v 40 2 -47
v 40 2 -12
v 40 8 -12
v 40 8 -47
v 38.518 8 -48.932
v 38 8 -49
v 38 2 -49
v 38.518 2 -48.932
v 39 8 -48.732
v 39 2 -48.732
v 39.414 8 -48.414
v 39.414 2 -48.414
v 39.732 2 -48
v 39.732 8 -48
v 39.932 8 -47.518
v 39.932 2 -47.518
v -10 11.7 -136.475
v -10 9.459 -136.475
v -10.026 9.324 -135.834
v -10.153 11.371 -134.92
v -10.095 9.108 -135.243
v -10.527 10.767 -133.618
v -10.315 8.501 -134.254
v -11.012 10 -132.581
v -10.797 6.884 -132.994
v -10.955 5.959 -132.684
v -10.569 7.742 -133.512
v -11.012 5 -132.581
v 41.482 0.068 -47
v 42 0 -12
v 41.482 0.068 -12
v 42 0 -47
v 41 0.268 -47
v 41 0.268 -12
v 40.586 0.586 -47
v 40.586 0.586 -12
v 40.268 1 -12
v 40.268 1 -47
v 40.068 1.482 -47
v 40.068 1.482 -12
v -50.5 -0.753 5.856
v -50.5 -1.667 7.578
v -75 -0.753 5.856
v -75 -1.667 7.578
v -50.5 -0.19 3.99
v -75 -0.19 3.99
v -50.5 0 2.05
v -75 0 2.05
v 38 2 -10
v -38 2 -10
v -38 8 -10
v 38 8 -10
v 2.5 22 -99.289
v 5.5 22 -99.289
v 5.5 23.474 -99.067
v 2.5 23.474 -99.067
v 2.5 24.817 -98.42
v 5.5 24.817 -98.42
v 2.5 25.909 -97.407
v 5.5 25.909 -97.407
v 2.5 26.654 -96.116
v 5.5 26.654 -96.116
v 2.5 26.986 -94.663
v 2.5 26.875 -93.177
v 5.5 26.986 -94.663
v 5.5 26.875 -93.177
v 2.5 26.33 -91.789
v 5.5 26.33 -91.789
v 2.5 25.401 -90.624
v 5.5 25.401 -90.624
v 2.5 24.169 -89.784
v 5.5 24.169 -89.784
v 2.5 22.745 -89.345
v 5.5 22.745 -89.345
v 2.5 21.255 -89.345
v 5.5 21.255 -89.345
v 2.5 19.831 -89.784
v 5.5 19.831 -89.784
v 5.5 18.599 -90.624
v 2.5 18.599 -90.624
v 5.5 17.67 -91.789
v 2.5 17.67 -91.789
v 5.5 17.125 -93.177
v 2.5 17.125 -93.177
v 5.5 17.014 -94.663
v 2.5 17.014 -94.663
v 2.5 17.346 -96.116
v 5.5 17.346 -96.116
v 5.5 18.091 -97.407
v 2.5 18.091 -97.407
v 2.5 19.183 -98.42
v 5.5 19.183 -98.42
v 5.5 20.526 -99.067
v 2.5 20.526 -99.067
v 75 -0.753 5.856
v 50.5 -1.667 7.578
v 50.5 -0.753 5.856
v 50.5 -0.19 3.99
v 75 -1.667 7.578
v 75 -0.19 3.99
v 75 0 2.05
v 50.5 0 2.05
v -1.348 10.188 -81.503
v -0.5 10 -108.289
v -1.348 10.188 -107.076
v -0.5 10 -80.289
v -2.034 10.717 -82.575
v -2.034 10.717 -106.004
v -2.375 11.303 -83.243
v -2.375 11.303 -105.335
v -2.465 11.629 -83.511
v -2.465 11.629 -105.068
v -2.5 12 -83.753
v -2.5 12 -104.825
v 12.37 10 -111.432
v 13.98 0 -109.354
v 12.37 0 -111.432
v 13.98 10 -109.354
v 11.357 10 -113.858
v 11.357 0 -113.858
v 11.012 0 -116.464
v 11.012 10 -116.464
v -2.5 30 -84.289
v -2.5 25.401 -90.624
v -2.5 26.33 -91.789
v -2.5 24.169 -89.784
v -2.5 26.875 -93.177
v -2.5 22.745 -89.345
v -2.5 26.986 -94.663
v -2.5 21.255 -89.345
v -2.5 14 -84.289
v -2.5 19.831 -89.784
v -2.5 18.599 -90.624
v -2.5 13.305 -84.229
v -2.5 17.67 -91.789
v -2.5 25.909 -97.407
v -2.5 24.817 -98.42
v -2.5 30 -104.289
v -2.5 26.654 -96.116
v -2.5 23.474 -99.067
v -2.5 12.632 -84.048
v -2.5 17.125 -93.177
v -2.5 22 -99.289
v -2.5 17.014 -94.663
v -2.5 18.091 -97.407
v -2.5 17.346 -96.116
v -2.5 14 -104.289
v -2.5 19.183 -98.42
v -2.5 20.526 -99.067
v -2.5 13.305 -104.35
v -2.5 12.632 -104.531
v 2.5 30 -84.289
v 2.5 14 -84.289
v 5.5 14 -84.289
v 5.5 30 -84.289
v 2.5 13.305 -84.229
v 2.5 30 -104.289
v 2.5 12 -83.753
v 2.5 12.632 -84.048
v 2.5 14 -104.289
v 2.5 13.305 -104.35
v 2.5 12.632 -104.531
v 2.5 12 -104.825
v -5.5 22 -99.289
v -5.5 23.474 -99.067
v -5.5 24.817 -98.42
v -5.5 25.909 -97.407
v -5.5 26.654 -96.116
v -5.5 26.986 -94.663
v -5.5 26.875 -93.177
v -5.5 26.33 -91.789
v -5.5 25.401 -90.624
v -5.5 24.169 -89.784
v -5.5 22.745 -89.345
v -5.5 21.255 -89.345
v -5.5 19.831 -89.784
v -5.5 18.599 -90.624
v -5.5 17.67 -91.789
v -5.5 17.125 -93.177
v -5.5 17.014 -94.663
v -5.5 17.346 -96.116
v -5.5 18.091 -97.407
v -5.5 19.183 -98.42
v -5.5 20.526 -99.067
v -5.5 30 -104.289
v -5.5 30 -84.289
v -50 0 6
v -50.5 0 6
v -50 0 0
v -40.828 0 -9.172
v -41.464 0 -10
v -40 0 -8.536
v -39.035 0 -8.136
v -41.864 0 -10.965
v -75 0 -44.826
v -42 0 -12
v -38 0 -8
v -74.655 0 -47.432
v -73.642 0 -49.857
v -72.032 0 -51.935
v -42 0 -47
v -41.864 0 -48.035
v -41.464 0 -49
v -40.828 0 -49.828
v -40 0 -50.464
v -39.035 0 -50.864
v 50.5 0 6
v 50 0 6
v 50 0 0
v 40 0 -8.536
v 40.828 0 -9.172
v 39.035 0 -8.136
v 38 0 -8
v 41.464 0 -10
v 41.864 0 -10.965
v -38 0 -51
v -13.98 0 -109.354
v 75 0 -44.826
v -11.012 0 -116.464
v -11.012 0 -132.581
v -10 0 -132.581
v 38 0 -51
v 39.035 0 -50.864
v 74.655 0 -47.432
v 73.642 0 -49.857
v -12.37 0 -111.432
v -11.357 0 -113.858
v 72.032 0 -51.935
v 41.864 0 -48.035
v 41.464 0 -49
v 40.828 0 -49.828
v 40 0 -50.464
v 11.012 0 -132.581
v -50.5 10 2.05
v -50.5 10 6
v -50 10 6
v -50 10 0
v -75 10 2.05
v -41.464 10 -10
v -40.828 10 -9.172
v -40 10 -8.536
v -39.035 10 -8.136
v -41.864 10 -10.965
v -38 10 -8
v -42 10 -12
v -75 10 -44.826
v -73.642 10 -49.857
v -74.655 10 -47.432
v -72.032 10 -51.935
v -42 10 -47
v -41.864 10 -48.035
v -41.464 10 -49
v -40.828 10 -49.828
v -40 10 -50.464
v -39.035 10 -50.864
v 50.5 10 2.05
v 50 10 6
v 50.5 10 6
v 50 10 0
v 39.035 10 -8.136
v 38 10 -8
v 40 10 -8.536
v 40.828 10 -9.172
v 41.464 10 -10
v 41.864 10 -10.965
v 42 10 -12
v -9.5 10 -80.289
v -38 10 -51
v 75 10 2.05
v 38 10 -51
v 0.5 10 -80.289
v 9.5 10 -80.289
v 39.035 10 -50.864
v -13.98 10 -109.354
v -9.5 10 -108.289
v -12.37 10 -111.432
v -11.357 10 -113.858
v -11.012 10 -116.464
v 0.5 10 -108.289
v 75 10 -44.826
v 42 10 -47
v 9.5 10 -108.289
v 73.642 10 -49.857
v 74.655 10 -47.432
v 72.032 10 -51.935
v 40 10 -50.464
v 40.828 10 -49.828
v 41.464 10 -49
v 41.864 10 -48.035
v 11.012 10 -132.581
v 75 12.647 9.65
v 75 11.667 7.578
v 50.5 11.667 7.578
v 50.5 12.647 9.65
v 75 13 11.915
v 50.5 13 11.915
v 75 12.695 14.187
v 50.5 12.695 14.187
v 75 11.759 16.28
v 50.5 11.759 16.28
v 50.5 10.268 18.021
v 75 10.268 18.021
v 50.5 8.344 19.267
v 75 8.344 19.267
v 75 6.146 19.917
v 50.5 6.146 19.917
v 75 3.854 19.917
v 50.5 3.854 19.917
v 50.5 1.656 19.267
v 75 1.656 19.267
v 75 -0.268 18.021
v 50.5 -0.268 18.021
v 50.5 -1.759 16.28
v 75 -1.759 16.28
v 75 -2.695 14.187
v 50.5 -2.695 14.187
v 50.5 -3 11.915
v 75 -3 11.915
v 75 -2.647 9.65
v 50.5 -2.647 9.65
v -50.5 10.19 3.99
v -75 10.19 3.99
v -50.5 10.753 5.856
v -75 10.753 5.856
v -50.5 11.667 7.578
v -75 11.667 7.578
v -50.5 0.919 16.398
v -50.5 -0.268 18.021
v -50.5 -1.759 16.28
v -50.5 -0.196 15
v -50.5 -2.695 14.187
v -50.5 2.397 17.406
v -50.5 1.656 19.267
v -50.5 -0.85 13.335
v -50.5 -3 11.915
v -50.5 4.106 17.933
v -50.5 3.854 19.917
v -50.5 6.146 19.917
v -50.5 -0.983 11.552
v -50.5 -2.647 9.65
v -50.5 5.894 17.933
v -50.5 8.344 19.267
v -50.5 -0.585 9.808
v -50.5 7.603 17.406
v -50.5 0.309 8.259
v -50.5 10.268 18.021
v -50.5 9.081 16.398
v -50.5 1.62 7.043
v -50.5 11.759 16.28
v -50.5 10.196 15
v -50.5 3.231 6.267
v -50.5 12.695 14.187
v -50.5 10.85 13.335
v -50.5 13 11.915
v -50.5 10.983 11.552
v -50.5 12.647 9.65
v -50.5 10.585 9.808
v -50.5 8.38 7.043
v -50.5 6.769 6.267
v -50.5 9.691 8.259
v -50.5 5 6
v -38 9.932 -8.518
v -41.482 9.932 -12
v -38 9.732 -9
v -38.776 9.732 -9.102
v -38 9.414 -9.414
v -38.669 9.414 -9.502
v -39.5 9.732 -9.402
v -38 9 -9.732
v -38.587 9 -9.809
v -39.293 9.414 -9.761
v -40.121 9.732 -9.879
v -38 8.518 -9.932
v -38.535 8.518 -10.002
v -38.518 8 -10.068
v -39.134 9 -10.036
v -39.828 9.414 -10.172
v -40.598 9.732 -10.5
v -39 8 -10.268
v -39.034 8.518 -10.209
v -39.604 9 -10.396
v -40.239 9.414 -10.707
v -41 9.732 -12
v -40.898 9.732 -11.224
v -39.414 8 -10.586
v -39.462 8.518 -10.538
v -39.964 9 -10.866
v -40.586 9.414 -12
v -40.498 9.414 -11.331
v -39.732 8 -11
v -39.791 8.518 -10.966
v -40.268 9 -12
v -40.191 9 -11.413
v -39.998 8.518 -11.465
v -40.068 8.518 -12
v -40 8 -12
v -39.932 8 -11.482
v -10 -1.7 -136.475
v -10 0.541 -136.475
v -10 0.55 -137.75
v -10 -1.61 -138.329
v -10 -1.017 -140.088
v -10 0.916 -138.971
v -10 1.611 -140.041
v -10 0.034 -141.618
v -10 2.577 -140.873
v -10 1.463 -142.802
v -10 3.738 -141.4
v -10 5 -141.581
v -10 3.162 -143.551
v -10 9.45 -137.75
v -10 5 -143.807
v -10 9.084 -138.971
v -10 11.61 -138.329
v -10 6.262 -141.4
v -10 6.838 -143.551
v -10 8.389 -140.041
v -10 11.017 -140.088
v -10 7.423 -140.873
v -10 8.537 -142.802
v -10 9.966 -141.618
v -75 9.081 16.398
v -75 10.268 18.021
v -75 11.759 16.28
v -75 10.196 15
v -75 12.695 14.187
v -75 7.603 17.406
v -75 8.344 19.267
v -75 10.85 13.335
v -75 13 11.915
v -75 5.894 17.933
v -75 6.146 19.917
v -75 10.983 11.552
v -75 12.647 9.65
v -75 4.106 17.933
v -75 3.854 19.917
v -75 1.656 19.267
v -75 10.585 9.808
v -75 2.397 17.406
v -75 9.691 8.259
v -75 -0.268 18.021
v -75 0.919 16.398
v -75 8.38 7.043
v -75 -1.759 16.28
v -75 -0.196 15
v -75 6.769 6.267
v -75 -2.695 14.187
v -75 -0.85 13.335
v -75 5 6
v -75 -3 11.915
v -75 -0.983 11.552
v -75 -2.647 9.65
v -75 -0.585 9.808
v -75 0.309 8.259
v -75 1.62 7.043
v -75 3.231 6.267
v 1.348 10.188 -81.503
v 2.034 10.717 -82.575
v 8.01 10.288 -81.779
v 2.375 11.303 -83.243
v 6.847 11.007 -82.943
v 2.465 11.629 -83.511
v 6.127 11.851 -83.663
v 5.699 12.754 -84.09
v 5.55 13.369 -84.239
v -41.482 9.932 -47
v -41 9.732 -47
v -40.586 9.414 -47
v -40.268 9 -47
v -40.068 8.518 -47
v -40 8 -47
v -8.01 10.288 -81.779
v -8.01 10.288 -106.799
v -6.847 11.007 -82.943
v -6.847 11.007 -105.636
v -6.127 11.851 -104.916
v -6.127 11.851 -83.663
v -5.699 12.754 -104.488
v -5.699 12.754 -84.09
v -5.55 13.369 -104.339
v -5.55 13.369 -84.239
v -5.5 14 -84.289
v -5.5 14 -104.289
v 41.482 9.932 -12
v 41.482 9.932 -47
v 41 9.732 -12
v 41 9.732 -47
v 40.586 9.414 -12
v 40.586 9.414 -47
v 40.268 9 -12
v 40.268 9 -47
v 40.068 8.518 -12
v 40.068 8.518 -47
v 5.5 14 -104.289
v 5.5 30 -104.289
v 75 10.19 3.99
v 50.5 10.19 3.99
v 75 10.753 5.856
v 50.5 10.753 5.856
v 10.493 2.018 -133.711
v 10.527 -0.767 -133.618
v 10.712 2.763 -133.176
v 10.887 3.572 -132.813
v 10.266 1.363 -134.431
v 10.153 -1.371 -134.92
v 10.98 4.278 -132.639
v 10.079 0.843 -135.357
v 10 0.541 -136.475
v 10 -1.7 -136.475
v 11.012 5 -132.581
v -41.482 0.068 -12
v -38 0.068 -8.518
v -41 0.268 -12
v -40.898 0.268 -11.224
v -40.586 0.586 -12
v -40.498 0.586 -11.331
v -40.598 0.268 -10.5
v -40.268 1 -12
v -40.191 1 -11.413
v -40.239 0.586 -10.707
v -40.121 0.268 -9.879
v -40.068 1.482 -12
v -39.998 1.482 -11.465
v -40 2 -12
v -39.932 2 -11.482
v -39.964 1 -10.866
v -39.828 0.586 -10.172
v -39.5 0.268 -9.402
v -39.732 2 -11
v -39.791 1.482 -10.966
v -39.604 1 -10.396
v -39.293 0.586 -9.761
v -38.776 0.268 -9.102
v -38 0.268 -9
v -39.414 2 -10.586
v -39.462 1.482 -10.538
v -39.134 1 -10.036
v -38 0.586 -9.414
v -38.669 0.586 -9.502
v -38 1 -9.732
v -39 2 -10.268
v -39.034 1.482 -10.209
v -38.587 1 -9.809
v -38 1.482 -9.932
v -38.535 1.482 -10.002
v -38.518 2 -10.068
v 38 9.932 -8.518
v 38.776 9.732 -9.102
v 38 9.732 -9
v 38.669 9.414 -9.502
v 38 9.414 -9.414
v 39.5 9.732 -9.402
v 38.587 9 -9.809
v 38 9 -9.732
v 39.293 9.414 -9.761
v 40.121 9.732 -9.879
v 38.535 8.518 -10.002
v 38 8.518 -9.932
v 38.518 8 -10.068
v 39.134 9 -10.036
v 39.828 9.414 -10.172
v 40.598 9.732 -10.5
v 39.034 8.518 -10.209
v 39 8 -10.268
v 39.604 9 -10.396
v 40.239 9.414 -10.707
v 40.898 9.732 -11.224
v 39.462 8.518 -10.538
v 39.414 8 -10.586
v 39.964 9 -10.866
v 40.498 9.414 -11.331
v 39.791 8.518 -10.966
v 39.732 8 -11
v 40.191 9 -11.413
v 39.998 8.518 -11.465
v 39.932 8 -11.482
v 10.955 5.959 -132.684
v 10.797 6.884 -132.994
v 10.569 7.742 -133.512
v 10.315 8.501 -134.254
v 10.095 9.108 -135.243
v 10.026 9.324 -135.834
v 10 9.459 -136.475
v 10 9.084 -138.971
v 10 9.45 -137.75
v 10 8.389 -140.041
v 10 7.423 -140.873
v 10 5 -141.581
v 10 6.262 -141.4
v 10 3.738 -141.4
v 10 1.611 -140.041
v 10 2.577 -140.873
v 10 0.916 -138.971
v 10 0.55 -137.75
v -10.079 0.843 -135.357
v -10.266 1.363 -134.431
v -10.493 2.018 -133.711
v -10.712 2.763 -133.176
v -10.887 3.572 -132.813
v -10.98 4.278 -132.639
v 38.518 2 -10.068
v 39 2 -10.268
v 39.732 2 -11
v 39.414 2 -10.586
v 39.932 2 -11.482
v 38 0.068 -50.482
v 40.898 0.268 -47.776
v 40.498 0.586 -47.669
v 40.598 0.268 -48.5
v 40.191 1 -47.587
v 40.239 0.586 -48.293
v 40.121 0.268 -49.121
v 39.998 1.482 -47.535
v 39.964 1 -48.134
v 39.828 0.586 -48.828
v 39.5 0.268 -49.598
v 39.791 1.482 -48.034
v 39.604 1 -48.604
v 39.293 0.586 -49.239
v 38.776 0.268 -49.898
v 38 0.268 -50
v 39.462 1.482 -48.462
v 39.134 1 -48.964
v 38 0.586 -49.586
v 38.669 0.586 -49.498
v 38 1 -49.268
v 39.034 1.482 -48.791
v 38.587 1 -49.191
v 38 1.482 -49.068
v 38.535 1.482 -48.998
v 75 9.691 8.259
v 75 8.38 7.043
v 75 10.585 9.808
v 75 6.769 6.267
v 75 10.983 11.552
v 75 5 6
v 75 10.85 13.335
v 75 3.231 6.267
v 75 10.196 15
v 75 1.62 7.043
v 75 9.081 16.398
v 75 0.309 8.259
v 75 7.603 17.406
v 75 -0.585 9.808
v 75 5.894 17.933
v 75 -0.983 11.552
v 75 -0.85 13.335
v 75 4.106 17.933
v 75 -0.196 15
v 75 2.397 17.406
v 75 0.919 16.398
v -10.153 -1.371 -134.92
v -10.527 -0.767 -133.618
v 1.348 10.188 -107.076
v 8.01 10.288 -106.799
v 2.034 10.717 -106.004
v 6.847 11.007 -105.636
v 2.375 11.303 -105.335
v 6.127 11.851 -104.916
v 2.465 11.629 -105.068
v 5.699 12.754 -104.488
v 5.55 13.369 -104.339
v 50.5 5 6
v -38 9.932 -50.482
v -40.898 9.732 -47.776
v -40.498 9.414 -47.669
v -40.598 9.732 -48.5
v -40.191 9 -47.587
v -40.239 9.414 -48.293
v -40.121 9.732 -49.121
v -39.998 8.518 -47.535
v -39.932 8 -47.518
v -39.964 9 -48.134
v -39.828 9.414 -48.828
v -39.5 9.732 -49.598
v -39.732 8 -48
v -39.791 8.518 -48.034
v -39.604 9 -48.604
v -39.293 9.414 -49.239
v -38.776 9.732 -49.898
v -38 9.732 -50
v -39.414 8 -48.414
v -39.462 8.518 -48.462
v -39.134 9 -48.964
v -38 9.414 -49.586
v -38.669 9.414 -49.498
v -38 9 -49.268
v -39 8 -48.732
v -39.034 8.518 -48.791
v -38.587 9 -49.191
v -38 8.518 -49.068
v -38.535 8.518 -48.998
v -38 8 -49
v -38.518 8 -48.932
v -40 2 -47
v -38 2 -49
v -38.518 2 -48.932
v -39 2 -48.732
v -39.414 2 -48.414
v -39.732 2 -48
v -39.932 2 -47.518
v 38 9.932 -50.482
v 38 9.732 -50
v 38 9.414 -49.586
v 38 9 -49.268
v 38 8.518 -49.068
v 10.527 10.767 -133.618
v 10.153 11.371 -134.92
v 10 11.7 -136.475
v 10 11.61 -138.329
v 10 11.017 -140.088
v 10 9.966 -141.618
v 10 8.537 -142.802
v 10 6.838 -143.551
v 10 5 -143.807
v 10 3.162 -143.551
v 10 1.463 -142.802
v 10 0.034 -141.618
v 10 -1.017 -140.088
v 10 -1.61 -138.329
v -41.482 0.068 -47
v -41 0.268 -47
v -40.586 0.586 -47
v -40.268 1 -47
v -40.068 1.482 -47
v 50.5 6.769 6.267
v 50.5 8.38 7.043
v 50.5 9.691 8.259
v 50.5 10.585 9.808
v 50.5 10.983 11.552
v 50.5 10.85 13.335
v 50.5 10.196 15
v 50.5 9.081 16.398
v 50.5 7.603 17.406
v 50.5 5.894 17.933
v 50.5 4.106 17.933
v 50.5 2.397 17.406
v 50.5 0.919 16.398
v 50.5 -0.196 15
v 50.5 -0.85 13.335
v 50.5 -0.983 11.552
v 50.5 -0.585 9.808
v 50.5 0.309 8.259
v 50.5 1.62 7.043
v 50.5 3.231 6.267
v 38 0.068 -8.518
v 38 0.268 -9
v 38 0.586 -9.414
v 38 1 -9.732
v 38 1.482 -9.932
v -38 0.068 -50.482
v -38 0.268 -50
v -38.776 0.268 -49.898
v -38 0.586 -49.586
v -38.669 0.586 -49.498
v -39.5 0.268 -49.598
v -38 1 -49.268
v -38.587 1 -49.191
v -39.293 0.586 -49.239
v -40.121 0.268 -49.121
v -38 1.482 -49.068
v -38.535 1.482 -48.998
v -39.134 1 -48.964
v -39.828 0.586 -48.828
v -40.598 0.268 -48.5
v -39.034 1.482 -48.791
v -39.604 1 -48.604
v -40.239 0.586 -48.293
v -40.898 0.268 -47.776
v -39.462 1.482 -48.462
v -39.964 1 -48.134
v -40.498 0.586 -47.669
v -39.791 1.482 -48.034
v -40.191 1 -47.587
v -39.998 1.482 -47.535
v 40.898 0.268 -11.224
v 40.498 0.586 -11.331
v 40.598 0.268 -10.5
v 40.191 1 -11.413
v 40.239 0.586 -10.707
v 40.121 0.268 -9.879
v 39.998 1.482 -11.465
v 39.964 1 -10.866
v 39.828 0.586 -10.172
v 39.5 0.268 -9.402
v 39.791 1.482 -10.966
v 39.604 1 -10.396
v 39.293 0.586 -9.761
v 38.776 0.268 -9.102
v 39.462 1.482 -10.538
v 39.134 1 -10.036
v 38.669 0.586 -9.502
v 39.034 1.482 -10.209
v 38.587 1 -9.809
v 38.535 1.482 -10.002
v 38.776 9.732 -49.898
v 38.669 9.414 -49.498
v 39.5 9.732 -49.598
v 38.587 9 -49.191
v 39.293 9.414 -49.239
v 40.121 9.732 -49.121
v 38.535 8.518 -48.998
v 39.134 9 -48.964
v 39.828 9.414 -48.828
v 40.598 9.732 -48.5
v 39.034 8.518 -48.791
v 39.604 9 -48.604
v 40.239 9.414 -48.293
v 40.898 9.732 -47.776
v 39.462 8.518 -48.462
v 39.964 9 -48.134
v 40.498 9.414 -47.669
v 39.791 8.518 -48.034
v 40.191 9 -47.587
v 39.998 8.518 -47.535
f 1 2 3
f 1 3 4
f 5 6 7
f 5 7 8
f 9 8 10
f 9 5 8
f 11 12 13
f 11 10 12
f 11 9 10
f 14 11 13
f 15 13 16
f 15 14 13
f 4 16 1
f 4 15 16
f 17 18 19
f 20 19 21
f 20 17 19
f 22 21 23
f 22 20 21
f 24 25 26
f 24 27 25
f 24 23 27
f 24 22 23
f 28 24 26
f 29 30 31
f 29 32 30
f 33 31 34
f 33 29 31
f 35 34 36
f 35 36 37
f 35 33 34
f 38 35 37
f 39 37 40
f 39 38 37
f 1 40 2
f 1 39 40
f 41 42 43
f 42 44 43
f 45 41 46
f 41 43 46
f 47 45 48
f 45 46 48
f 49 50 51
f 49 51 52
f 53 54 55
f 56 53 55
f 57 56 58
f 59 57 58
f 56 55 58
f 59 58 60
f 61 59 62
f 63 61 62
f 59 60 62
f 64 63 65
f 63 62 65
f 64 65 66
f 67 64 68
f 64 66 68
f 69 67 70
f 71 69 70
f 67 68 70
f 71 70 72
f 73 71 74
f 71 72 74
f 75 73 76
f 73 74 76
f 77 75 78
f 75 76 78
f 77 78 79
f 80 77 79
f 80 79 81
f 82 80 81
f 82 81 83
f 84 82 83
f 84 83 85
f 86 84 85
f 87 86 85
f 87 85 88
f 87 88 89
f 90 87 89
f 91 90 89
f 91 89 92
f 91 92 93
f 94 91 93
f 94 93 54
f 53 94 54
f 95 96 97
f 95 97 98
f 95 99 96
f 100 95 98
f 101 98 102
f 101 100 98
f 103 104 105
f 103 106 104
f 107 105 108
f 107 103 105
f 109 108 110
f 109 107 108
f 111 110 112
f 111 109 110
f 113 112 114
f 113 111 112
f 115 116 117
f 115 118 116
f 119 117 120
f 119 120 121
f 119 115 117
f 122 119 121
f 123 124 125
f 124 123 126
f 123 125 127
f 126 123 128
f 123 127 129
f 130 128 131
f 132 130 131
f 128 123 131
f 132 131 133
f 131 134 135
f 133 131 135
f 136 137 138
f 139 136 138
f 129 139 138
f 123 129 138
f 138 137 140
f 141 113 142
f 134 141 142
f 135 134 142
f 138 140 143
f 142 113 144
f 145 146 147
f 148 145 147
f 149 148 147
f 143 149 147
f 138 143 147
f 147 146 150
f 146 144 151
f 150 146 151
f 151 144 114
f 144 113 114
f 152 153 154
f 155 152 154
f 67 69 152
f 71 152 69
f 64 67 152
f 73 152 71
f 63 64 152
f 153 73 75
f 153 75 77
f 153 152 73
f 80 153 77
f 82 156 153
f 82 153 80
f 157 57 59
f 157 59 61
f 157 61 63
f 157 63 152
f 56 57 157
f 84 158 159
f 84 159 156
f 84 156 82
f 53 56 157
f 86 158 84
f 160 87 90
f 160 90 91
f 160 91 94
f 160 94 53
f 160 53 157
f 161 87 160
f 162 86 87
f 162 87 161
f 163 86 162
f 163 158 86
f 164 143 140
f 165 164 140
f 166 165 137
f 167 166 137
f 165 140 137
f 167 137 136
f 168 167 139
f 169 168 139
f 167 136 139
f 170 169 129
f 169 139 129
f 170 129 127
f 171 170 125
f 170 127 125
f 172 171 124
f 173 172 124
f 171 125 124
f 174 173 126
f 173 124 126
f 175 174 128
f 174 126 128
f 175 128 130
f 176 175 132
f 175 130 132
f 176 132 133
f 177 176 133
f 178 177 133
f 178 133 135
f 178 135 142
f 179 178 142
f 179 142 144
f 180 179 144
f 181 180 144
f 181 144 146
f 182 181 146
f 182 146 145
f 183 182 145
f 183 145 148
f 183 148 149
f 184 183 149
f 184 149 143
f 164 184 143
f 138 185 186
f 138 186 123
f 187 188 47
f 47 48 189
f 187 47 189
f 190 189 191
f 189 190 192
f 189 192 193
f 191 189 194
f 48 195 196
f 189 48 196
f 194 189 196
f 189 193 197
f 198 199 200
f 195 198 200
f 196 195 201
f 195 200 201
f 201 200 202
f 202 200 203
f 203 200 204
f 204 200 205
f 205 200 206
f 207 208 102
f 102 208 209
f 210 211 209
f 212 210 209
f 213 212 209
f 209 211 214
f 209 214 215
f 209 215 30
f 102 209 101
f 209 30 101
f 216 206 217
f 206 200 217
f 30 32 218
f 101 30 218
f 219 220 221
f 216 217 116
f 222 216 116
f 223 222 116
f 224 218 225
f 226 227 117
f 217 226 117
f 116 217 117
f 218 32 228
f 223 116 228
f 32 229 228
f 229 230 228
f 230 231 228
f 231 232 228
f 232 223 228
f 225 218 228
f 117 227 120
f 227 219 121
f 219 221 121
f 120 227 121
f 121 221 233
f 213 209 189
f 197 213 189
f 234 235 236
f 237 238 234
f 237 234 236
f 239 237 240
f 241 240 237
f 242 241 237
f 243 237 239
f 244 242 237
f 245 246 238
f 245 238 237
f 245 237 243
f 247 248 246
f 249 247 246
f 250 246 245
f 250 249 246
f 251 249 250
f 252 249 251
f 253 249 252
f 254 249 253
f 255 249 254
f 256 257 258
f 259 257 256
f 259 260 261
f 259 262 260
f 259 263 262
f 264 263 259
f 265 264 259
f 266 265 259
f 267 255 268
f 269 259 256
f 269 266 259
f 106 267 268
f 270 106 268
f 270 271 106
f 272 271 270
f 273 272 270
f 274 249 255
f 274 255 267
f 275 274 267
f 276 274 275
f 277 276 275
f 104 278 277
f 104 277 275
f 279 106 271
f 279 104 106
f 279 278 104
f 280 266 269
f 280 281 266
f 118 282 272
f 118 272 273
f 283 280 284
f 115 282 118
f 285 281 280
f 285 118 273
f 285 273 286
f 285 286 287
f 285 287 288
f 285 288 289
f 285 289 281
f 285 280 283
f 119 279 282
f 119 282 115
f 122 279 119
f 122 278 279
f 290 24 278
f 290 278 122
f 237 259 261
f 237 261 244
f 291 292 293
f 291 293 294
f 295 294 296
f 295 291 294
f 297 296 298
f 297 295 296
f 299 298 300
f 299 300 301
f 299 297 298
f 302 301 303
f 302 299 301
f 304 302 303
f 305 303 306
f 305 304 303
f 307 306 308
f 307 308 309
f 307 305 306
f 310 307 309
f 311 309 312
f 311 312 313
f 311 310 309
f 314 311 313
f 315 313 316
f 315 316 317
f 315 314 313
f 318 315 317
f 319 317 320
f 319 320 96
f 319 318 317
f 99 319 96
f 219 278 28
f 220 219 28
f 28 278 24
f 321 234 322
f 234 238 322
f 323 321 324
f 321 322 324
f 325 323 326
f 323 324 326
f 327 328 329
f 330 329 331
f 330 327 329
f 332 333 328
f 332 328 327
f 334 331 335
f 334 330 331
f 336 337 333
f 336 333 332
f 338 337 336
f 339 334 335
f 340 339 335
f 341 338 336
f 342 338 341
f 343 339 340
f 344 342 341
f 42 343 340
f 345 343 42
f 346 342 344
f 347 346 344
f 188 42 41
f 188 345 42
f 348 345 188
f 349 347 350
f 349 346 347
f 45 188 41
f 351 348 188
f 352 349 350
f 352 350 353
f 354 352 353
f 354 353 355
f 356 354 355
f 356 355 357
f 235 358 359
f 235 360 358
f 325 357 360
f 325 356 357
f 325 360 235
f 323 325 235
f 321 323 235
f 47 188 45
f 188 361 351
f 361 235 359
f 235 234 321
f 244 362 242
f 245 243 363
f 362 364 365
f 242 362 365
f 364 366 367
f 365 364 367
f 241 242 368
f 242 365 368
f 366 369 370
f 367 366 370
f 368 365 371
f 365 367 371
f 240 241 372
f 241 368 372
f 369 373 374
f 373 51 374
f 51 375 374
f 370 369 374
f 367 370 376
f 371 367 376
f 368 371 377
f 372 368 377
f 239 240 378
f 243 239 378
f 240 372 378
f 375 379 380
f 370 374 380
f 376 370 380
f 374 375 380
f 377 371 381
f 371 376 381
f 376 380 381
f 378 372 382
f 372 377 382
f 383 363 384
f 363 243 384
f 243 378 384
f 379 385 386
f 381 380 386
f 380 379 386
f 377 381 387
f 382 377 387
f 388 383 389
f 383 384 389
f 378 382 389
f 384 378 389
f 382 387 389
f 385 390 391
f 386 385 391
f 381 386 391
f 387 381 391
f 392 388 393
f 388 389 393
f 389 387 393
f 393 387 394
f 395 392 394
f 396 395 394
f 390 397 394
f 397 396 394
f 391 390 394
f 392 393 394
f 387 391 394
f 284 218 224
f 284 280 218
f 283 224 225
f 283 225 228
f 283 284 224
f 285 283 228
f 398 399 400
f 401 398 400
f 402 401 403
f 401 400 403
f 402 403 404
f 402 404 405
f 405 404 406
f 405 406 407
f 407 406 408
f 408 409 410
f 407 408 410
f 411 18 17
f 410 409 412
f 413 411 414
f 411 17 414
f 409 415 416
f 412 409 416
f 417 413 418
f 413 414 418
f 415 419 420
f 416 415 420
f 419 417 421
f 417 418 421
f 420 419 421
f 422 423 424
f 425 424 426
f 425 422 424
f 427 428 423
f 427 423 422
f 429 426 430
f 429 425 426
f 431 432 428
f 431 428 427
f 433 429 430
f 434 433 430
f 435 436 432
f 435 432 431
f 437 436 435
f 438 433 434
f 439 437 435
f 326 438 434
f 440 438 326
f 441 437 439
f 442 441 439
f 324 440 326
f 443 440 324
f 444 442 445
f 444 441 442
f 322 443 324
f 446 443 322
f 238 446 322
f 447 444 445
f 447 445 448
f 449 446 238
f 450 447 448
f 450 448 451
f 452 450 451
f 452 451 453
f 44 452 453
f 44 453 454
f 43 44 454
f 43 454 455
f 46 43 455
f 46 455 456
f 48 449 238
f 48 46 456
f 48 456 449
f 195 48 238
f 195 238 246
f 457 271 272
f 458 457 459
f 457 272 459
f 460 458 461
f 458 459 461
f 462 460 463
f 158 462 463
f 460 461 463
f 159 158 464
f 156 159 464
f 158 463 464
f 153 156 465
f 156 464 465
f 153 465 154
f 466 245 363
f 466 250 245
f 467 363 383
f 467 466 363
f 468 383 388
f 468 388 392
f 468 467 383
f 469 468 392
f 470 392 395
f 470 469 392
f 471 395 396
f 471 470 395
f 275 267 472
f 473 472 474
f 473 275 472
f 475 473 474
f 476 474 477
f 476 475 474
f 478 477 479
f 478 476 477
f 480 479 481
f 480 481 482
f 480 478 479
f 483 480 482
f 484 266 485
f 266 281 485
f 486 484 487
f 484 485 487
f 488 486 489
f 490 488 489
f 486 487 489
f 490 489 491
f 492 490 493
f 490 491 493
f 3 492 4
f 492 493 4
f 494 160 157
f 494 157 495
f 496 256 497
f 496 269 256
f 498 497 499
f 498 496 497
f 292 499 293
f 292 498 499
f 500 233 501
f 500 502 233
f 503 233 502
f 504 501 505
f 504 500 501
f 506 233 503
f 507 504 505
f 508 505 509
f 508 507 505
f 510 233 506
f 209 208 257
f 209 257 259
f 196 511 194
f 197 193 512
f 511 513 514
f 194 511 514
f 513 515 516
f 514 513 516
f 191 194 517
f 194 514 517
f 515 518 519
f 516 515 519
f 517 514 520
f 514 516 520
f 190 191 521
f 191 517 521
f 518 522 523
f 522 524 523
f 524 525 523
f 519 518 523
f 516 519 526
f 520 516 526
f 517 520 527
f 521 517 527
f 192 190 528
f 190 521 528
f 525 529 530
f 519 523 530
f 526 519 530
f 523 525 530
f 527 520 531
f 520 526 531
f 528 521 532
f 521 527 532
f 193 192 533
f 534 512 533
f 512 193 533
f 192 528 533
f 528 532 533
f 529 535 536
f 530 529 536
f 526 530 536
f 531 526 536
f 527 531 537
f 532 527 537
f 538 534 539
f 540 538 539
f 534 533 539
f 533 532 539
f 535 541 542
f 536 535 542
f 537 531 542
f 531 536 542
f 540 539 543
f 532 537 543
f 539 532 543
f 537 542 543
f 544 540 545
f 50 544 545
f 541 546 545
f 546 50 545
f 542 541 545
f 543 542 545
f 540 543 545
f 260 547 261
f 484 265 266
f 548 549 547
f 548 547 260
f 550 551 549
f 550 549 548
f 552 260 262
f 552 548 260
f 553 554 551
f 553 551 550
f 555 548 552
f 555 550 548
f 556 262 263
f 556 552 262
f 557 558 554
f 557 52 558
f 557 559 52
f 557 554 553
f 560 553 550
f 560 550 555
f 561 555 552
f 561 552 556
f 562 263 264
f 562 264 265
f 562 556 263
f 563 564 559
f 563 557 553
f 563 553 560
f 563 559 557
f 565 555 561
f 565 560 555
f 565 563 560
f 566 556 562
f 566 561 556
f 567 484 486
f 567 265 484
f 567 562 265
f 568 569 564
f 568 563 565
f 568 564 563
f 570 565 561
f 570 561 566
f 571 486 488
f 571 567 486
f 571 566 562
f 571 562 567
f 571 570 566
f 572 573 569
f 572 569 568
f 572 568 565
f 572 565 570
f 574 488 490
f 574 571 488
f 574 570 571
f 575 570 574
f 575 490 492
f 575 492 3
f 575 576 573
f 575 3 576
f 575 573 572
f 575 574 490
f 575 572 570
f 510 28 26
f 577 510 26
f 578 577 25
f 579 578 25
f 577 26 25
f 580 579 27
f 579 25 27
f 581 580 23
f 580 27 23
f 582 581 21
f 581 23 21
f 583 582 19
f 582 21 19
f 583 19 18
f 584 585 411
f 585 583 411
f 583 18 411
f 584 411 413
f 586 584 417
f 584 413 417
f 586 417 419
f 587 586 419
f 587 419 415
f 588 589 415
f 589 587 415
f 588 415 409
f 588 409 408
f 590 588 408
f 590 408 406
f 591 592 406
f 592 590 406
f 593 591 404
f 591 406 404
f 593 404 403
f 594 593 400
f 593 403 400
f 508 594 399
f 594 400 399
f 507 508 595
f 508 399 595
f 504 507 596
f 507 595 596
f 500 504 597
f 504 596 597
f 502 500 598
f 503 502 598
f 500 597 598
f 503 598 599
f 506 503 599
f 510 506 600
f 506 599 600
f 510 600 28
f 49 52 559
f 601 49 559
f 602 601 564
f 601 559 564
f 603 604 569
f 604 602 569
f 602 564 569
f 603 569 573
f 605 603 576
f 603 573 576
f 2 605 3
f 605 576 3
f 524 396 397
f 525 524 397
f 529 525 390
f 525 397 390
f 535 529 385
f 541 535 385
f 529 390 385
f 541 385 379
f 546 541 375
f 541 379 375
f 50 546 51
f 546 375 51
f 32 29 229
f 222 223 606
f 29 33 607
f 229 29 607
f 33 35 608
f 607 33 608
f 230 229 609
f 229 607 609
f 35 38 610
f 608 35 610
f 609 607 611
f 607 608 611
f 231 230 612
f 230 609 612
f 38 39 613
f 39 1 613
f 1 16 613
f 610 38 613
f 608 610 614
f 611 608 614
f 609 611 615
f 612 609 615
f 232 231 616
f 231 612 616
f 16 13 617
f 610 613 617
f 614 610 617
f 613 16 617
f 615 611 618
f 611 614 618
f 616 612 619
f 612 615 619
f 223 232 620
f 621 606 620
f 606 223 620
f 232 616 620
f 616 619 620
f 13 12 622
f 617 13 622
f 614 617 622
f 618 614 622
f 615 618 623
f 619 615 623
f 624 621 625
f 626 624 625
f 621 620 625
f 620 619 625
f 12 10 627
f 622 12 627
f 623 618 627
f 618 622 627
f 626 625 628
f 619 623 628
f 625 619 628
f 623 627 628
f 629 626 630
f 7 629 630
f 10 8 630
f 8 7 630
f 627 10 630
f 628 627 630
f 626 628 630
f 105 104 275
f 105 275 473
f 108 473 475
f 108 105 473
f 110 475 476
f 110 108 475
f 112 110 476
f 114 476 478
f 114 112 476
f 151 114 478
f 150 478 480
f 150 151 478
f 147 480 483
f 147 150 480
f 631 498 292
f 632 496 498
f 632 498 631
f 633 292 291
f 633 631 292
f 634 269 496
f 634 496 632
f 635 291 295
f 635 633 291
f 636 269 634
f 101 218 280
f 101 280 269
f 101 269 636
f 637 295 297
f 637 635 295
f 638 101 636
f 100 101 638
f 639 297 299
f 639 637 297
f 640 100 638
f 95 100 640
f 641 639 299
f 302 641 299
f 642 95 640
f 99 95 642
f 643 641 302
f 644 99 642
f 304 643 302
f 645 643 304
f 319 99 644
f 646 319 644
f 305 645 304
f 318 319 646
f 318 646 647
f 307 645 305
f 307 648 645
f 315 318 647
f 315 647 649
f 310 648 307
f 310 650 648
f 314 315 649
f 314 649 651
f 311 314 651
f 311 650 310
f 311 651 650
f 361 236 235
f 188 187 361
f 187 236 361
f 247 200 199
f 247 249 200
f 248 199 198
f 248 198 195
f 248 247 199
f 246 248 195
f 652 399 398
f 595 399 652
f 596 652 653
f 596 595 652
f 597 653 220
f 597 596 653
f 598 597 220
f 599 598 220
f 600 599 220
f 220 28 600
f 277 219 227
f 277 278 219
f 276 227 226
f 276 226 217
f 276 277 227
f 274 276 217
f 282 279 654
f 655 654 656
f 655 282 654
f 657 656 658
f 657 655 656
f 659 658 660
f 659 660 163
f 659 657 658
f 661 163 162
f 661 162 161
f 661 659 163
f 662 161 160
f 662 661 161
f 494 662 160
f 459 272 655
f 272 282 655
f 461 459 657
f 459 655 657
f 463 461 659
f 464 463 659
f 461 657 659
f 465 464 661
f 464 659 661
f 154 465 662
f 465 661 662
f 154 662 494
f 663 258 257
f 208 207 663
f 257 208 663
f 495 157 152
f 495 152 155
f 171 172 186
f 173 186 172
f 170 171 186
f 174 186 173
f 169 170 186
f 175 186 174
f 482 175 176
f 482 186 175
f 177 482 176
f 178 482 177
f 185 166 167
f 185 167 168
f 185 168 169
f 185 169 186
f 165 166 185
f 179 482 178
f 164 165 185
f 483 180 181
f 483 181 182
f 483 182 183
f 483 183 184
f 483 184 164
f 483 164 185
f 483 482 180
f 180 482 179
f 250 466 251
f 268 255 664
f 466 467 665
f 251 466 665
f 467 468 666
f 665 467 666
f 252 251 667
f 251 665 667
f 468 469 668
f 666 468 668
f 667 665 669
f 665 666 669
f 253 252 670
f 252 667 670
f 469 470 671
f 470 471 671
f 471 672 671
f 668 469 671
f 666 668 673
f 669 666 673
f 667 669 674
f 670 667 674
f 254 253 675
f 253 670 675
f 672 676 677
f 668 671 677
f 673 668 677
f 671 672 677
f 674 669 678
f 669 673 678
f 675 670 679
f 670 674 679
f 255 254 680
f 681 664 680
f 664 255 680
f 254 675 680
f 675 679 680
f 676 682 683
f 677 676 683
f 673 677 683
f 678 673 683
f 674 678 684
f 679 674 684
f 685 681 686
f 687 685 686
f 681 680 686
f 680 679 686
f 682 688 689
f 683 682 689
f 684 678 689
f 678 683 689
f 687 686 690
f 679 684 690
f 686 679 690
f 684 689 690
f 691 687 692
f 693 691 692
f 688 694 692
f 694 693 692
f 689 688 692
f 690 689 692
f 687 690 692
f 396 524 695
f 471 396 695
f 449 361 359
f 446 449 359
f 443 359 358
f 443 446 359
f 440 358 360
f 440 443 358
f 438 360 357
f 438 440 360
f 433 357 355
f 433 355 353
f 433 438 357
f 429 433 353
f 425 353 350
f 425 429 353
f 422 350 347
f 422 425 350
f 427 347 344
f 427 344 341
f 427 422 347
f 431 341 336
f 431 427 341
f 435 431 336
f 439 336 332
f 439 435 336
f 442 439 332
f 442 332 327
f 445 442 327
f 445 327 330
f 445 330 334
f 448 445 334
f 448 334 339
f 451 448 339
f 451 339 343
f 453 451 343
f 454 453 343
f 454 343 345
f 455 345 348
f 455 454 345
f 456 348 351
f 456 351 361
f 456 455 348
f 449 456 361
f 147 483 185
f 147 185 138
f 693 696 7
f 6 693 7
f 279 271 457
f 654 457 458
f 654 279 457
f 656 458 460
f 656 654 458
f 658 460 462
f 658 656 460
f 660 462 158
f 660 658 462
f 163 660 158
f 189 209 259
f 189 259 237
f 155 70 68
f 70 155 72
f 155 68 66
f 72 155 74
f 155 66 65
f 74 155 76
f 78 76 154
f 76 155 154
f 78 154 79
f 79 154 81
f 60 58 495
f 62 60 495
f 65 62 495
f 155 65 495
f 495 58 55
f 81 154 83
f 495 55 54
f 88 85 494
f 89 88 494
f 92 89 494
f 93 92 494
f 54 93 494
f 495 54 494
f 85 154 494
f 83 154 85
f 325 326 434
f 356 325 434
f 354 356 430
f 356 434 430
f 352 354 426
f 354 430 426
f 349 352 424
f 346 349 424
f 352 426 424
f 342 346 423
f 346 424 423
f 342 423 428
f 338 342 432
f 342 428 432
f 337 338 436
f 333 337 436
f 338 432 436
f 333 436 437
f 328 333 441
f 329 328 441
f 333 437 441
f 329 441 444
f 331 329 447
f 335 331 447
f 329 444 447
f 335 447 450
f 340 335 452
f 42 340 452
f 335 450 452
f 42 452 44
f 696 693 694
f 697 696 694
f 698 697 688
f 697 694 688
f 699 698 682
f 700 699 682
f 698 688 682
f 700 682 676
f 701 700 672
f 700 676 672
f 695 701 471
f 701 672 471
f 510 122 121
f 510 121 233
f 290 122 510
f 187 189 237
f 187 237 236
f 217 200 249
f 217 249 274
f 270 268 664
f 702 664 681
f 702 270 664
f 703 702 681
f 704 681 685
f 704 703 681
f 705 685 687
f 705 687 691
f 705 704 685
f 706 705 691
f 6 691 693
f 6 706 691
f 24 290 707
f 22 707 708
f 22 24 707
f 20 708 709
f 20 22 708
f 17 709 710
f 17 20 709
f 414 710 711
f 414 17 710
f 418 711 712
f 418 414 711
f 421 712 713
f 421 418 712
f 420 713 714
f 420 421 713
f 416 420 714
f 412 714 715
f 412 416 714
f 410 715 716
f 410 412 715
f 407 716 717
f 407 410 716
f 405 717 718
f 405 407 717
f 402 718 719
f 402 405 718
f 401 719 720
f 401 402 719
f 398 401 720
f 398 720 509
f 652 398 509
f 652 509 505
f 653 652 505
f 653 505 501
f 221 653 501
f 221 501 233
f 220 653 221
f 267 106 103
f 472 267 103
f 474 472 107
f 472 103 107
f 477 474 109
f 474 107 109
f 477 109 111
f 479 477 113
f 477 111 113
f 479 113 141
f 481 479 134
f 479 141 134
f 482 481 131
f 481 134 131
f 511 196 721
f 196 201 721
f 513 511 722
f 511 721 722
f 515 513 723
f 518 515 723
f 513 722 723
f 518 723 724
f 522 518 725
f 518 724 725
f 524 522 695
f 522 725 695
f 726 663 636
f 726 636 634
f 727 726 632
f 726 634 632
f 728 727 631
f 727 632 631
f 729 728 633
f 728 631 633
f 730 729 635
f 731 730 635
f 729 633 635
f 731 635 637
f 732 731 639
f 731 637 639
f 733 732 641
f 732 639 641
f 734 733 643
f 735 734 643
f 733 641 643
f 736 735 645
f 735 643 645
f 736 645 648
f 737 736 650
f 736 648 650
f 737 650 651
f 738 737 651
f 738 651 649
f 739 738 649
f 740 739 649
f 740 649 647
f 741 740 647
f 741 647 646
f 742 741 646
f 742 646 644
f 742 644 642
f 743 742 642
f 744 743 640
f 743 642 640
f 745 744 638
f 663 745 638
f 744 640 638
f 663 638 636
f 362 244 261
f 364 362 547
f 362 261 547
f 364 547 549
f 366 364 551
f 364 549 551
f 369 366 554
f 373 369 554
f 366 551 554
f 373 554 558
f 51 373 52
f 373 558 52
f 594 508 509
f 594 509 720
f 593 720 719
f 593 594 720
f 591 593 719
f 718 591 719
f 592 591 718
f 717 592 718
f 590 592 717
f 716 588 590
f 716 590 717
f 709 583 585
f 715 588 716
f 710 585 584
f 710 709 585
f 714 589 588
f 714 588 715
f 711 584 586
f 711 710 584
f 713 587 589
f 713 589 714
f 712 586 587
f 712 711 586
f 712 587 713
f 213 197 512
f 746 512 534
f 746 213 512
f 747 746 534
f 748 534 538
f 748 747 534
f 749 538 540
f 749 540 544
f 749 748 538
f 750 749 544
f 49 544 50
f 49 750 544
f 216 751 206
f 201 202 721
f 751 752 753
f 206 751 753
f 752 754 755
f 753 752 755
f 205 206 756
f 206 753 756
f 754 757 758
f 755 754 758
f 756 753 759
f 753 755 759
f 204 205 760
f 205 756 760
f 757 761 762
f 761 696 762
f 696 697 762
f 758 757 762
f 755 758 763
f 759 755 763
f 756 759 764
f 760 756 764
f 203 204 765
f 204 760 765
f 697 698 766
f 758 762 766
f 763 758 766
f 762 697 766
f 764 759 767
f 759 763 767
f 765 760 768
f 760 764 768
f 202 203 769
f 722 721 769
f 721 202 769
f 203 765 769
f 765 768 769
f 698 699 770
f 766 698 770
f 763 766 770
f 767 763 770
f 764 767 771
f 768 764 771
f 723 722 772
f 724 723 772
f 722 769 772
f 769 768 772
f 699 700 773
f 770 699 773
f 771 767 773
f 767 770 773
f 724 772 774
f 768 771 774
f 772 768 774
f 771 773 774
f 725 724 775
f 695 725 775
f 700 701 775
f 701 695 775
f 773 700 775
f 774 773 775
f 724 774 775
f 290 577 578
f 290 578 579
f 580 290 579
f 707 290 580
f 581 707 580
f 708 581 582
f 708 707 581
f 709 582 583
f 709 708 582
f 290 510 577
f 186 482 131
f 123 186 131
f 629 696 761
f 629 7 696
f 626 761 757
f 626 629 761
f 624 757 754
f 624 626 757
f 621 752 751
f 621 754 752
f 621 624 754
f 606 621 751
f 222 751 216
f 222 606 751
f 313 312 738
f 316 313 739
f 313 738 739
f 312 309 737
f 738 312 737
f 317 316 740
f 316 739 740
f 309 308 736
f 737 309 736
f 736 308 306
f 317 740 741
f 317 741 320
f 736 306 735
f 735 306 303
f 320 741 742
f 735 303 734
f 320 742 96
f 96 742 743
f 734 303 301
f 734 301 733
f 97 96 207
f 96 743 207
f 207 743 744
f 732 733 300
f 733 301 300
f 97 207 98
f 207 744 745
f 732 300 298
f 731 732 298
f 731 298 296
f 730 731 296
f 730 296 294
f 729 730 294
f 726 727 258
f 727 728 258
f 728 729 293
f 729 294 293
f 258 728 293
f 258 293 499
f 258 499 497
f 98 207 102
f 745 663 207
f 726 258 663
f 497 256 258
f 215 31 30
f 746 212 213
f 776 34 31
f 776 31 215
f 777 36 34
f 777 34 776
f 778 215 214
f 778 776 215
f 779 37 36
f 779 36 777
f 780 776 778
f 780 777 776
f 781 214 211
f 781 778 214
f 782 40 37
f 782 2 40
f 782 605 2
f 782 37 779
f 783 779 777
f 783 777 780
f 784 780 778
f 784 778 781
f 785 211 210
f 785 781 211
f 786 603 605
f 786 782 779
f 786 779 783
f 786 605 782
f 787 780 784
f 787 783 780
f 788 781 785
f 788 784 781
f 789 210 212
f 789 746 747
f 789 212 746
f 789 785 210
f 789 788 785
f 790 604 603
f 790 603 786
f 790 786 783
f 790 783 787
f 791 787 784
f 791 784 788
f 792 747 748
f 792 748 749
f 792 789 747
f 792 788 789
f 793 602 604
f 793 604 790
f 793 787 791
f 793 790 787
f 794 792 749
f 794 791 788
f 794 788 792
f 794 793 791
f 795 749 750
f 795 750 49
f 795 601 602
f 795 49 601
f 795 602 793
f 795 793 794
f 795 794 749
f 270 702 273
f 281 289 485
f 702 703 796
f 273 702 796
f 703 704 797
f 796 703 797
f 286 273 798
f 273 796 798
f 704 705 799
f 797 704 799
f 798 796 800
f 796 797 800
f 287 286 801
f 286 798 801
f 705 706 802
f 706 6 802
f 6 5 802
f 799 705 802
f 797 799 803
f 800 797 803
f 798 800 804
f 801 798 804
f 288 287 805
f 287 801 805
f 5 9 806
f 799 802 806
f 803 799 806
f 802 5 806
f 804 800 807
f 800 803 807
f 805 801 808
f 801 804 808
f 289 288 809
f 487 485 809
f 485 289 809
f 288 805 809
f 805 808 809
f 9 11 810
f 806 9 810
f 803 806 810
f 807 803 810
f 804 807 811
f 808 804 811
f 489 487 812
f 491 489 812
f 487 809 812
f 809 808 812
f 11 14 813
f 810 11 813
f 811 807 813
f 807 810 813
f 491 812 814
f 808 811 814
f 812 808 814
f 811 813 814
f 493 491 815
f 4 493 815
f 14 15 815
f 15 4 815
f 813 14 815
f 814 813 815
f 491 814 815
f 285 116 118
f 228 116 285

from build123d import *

# Parameters (mm, degrees)
SKETCH1_W                = 80
SKETCH1_H                = 39
BOSS_EXTRUDE1_DEPTH      = 10
BOSS_EXTRUDE2_START      = -12.5
SKETCH4_R                = 8
SKETCH4_R_2              = 6
BOSS_EXTRUDE2_DEPTH      = 24.5
SKETCH10_W               = 22.023984498
SKETCH10_H               = 20.291265962
BOSS_EXTRUDE4_DEPTH      = 10
SKETCH13_W               = 3
SKETCH13_H               = 20
BOSS_EXTRUDE5_DEPTH      = 20
SKETCH14_R               = 5
CUT_EXTRUDE1_DEPTH       = 15
BOSS_EXTRUDE6_DEPTH      = 10
BOSS_EXTRUDE6_DEPTH_BACK = 10
SKETCH16_R               = 6.726812024
SKETCH16_R_2             = 4.5
FILLET2_R                = 4
FILLET4_R                = 2
FILLET8_R                = 10
FILLET9_R                = 8
FILLET15_R               = 4
FILLET16_R               = 2


with BuildPart() as part:
    # Sketch1 → Boss-Extrude1 (new body)
    with BuildSketch(Plane(origin=(0, 0, 0), x_dir=(1, 0, 0), z_dir=(0, 1, 0))):
        Polygon((11.011992249, 112.28929502), (75, 49), (75, -6), (50, -6), (50, 0), (-50, 0), (-50, -6), (-75, -6), (-75, 49), (-11.011992249, 112.28929502), align=None)
        with Locations((0, 29.5)):
            Rectangle(SKETCH1_W, SKETCH1_H, mode=Mode.SUBTRACT)
    extrude(amount=BOSS_EXTRUDE1_DEPTH)

    # Sketch4 → Boss-Extrude2 (add)
    with BuildSketch(Plane(origin=(-62.5, 0, 0), x_dir=(0, 0, -1), z_dir=(1, 0, 0)).offset(BOSS_EXTRUDE2_START)):
        with Locations((-12, 5)):
            Circle(SKETCH4_R)
        with Locations((-12, 5)):
            Circle(SKETCH4_R_2, mode=Mode.SUBTRACT)
    boss_extrude2 = extrude(amount=BOSS_EXTRUDE2_DEPTH)

    # Mirror1: Boss-Extrude2 across plane
    add(boss_extrude2.mirror(Plane(origin=(0, 0, 0), x_dir=(0, 0, 1), z_dir=(1, 0, 0))))

    # Sketch10 → Boss-Extrude4 (add)
    with BuildSketch(Plane(origin=(0, 10, 0), x_dir=(1, 0, 0), z_dir=(0, 1, 0))):
        with Locations((0, 122.434928001)):
            Rectangle(SKETCH10_W, SKETCH10_H)
    extrude(amount=-BOSS_EXTRUDE4_DEPTH)

    # Sketch13 → Boss-Extrude5 (add)
    with BuildSketch(Plane(origin=(0, 10, 0), x_dir=(1, 0, 0), z_dir=(0, 1, 0))):
        with Locations((-4, 94.28929502)):
            Rectangle(SKETCH13_W, SKETCH13_H)
        with Locations((4, 94.28929502)):
            Rectangle(SKETCH13_W, SKETCH13_H)
    extrude(amount=BOSS_EXTRUDE5_DEPTH)

    # Sketch14 → Cut-Extrude1 (cut)
    with BuildSketch(Plane(origin=(5.5, 0, 0), x_dir=(0, 0, -1), z_dir=(1, 0, 0))):
        with Locations((94.28929502, 22)):
            Circle(SKETCH14_R)
    extrude(amount=-CUT_EXTRUDE1_DEPTH, mode=Mode.SUBTRACT)

    # Sketch16 → Boss-Extrude6 (add, two sides: drawn at the far end of the back side and taken through both)
    with BuildSketch(Plane(origin=(0, 0, 0), x_dir=(0, 0, -1), z_dir=(1, 0, 0)).offset(-BOSS_EXTRUDE6_DEPTH_BACK)):
        with Locations((137.080560982, 5)):
            Circle(SKETCH16_R)
        with Locations(Location((137.080560982, 5, 0), (0, 0, 180))):
            Circle(SKETCH16_R_2, mode=Mode.SUBTRACT)
    extrude(amount=BOSS_EXTRUDE6_DEPTH + BOSS_EXTRUDE6_DEPTH_BACK)

    # Fillet2
    fillet2_edges = [part.edges().sort_by_distance(p)[0] for p in [
        (-4, 10, -104.28929502),
        (-5.5, 10, -94.28929502),
        (-4, 10, -84.28929502),
    ]]
    fillet(fillet2_edges, radius=FILLET2_R)

    # Fillet4
    fillet4_edges = [part.edges().sort_by_distance(p)[0] for p in [
        (40, 0, -29.5),
        (0, 0, -49),
        (-40, 0, -29.5),
        (0, 0, -10),
        (40, 5, -10),
        (40, 5, -49),
        (-40, 5, -49),
        (-40, 5, -10),
        (0, 10, -10),
        (-40, 10, -29.5),
        (0, 10, -49),
        (40, 10, -29.5),
    ]]
    fillet(fillet4_edges, radius=FILLET4_R)

    # Fillet8
    fillet8_edges = [part.edges().sort_by_distance(p)[0] for p in [
        (11.011992249, 5, -112.28929502),
        (75, 5, -49),
        (-75, 5, -49),
        (-11.011992249, 5, -112.28929502),
        (-62.75, 0, 5.755002002),
        (-62.75, 10, 5.755002002),
        (62.75, 0, 5.755002002),
        (62.75, 10, 5.755002002),
    ]]
    fillet(fillet8_edges, radius=FILLET8_R)

    # Fillet9
    # the kernel refuses this fillet: 8 mm, written as the material it adds along each edge
    with BuildSketch(Plane(origin=(10, 5, -132.580560982), x_dir=(1, 0, 0), z_dir=(0, -1, 0))) as fillet9_piece_1_section:
        with BuildLine():
            CenterArc((8, -3.894579268), FILLET9_R, 150.868059199, 29.131940801)
            Line((0, -3.894579268), (0, 0))
            Line((0, 0), (1.011992249, 0))
        make_face()
    fillet9_piece_1 = extrude(amount=14.73644817, mode=Mode.PRIVATE)
    fillet9_piece_1 = fillet9_piece_1 - Plane(origin=(10, 5, -137.080560982), x_dir=(0, 0, 1), z_dir=(-1, 0, 0)) * Cylinder(4.5, 46, mode=Mode.PRIVATE)
    fillet9_piece_1 = fillet9_piece_1 & Plane(origin=(10, 5, -137.080560982), x_dir=(0, 0, -1), z_dir=(-1, 0, 0)) * Cylinder(6.726812024, 46, mode=Mode.PRIVATE)
    add(fillet9_piece_1)
    with BuildSketch(Plane(origin=(10, 19.73644817, -132.580560982), x_dir=(1, 0, 0), z_dir=(0, -1, 0))) as fillet9_piece_2_section:
        with BuildLine():
            CenterArc((8, -3.894579268), FILLET9_R, 150.868059199, 29.131940801)
            Line((0, -3.894579268), (0, 0))
            Line((0, 0), (1.011992249, 0))
        make_face()
    fillet9_piece_2 = extrude(amount=14.73644817, mode=Mode.PRIVATE)
    fillet9_piece_2 = fillet9_piece_2 - Plane(origin=(10, 5, -137.080560982), x_dir=(0, 0, 1), z_dir=(-1, 0, 0)) * Cylinder(4.5, 46, mode=Mode.PRIVATE)
    fillet9_piece_2 = fillet9_piece_2 & Plane(origin=(10, 5, -137.080560982), x_dir=(0, 0, -1), z_dir=(-1, 0, 0)) * Cylinder(6.726812024, 46, mode=Mode.PRIVATE)
    add(fillet9_piece_2)
    with BuildSketch(Plane(origin=(-10, 5, -132.580560982), x_dir=(0, 0, -1), z_dir=(0, -1, 0))) as fillet9_piece_3_section:
        with BuildLine():
            CenterArc((3.894579268, -8), FILLET9_R, 90, 29.131940801)
            Line((0, -1.011992249), (0, 0))
            Line((0, 0), (3.894579268, 0))
        make_face()
    fillet9_piece_3 = extrude(amount=14.73644817, mode=Mode.PRIVATE)
    fillet9_piece_3 = fillet9_piece_3 - Plane(origin=(-10, 5, -137.080560982), x_dir=(0, 0, 1), z_dir=(-1, 0, 0)) * Cylinder(4.5, 46, mode=Mode.PRIVATE)
    fillet9_piece_3 = fillet9_piece_3 & Plane(origin=(-10, 5, -137.080560982), x_dir=(0, 0, -1), z_dir=(-1, 0, 0)) * Cylinder(6.726812024, 46, mode=Mode.PRIVATE)
    add(fillet9_piece_3)
    with BuildSketch(Plane(origin=(-10, 19.73644817, -132.580560982), x_dir=(0, 0, -1), z_dir=(0, -1, 0))) as fillet9_piece_4_section:
        with BuildLine():
            CenterArc((3.894579268, -8), FILLET9_R, 90, 29.131940801)
            Line((0, -1.011992249), (0, 0))
            Line((0, 0), (3.894579268, 0))
        make_face()
    fillet9_piece_4 = extrude(amount=14.73644817, mode=Mode.PRIVATE)
    fillet9_piece_4 = fillet9_piece_4 - Plane(origin=(-10, 5, -137.080560982), x_dir=(0, 0, 1), z_dir=(-1, 0, 0)) * Cylinder(4.5, 46, mode=Mode.PRIVATE)
    fillet9_piece_4 = fillet9_piece_4 & Plane(origin=(-10, 5, -137.080560982), x_dir=(0, 0, -1), z_dir=(-1, 0, 0)) * Cylinder(6.726812024, 46, mode=Mode.PRIVATE)
    add(fillet9_piece_4)

    # Fillet15
    fillet15_edges = [part.edges().sort_by_distance(p)[0] for p in [
        (5.5, 10, -94.28929502),
        (4, 10, -104.28929502),
        (4, 10, -84.28929502),
    ]]
    fillet(fillet15_edges, radius=FILLET15_R)

    # Fillet16
    fillet16_edges = [part.edges().sort_by_distance(p)[0] for p in [
        (2.5, 10, -94.28929502),
        (-2.5, 10, -94.28929502),
    ]]
    fillet(fillet16_edges, radius=FILLET16_R)


solid = part.part
